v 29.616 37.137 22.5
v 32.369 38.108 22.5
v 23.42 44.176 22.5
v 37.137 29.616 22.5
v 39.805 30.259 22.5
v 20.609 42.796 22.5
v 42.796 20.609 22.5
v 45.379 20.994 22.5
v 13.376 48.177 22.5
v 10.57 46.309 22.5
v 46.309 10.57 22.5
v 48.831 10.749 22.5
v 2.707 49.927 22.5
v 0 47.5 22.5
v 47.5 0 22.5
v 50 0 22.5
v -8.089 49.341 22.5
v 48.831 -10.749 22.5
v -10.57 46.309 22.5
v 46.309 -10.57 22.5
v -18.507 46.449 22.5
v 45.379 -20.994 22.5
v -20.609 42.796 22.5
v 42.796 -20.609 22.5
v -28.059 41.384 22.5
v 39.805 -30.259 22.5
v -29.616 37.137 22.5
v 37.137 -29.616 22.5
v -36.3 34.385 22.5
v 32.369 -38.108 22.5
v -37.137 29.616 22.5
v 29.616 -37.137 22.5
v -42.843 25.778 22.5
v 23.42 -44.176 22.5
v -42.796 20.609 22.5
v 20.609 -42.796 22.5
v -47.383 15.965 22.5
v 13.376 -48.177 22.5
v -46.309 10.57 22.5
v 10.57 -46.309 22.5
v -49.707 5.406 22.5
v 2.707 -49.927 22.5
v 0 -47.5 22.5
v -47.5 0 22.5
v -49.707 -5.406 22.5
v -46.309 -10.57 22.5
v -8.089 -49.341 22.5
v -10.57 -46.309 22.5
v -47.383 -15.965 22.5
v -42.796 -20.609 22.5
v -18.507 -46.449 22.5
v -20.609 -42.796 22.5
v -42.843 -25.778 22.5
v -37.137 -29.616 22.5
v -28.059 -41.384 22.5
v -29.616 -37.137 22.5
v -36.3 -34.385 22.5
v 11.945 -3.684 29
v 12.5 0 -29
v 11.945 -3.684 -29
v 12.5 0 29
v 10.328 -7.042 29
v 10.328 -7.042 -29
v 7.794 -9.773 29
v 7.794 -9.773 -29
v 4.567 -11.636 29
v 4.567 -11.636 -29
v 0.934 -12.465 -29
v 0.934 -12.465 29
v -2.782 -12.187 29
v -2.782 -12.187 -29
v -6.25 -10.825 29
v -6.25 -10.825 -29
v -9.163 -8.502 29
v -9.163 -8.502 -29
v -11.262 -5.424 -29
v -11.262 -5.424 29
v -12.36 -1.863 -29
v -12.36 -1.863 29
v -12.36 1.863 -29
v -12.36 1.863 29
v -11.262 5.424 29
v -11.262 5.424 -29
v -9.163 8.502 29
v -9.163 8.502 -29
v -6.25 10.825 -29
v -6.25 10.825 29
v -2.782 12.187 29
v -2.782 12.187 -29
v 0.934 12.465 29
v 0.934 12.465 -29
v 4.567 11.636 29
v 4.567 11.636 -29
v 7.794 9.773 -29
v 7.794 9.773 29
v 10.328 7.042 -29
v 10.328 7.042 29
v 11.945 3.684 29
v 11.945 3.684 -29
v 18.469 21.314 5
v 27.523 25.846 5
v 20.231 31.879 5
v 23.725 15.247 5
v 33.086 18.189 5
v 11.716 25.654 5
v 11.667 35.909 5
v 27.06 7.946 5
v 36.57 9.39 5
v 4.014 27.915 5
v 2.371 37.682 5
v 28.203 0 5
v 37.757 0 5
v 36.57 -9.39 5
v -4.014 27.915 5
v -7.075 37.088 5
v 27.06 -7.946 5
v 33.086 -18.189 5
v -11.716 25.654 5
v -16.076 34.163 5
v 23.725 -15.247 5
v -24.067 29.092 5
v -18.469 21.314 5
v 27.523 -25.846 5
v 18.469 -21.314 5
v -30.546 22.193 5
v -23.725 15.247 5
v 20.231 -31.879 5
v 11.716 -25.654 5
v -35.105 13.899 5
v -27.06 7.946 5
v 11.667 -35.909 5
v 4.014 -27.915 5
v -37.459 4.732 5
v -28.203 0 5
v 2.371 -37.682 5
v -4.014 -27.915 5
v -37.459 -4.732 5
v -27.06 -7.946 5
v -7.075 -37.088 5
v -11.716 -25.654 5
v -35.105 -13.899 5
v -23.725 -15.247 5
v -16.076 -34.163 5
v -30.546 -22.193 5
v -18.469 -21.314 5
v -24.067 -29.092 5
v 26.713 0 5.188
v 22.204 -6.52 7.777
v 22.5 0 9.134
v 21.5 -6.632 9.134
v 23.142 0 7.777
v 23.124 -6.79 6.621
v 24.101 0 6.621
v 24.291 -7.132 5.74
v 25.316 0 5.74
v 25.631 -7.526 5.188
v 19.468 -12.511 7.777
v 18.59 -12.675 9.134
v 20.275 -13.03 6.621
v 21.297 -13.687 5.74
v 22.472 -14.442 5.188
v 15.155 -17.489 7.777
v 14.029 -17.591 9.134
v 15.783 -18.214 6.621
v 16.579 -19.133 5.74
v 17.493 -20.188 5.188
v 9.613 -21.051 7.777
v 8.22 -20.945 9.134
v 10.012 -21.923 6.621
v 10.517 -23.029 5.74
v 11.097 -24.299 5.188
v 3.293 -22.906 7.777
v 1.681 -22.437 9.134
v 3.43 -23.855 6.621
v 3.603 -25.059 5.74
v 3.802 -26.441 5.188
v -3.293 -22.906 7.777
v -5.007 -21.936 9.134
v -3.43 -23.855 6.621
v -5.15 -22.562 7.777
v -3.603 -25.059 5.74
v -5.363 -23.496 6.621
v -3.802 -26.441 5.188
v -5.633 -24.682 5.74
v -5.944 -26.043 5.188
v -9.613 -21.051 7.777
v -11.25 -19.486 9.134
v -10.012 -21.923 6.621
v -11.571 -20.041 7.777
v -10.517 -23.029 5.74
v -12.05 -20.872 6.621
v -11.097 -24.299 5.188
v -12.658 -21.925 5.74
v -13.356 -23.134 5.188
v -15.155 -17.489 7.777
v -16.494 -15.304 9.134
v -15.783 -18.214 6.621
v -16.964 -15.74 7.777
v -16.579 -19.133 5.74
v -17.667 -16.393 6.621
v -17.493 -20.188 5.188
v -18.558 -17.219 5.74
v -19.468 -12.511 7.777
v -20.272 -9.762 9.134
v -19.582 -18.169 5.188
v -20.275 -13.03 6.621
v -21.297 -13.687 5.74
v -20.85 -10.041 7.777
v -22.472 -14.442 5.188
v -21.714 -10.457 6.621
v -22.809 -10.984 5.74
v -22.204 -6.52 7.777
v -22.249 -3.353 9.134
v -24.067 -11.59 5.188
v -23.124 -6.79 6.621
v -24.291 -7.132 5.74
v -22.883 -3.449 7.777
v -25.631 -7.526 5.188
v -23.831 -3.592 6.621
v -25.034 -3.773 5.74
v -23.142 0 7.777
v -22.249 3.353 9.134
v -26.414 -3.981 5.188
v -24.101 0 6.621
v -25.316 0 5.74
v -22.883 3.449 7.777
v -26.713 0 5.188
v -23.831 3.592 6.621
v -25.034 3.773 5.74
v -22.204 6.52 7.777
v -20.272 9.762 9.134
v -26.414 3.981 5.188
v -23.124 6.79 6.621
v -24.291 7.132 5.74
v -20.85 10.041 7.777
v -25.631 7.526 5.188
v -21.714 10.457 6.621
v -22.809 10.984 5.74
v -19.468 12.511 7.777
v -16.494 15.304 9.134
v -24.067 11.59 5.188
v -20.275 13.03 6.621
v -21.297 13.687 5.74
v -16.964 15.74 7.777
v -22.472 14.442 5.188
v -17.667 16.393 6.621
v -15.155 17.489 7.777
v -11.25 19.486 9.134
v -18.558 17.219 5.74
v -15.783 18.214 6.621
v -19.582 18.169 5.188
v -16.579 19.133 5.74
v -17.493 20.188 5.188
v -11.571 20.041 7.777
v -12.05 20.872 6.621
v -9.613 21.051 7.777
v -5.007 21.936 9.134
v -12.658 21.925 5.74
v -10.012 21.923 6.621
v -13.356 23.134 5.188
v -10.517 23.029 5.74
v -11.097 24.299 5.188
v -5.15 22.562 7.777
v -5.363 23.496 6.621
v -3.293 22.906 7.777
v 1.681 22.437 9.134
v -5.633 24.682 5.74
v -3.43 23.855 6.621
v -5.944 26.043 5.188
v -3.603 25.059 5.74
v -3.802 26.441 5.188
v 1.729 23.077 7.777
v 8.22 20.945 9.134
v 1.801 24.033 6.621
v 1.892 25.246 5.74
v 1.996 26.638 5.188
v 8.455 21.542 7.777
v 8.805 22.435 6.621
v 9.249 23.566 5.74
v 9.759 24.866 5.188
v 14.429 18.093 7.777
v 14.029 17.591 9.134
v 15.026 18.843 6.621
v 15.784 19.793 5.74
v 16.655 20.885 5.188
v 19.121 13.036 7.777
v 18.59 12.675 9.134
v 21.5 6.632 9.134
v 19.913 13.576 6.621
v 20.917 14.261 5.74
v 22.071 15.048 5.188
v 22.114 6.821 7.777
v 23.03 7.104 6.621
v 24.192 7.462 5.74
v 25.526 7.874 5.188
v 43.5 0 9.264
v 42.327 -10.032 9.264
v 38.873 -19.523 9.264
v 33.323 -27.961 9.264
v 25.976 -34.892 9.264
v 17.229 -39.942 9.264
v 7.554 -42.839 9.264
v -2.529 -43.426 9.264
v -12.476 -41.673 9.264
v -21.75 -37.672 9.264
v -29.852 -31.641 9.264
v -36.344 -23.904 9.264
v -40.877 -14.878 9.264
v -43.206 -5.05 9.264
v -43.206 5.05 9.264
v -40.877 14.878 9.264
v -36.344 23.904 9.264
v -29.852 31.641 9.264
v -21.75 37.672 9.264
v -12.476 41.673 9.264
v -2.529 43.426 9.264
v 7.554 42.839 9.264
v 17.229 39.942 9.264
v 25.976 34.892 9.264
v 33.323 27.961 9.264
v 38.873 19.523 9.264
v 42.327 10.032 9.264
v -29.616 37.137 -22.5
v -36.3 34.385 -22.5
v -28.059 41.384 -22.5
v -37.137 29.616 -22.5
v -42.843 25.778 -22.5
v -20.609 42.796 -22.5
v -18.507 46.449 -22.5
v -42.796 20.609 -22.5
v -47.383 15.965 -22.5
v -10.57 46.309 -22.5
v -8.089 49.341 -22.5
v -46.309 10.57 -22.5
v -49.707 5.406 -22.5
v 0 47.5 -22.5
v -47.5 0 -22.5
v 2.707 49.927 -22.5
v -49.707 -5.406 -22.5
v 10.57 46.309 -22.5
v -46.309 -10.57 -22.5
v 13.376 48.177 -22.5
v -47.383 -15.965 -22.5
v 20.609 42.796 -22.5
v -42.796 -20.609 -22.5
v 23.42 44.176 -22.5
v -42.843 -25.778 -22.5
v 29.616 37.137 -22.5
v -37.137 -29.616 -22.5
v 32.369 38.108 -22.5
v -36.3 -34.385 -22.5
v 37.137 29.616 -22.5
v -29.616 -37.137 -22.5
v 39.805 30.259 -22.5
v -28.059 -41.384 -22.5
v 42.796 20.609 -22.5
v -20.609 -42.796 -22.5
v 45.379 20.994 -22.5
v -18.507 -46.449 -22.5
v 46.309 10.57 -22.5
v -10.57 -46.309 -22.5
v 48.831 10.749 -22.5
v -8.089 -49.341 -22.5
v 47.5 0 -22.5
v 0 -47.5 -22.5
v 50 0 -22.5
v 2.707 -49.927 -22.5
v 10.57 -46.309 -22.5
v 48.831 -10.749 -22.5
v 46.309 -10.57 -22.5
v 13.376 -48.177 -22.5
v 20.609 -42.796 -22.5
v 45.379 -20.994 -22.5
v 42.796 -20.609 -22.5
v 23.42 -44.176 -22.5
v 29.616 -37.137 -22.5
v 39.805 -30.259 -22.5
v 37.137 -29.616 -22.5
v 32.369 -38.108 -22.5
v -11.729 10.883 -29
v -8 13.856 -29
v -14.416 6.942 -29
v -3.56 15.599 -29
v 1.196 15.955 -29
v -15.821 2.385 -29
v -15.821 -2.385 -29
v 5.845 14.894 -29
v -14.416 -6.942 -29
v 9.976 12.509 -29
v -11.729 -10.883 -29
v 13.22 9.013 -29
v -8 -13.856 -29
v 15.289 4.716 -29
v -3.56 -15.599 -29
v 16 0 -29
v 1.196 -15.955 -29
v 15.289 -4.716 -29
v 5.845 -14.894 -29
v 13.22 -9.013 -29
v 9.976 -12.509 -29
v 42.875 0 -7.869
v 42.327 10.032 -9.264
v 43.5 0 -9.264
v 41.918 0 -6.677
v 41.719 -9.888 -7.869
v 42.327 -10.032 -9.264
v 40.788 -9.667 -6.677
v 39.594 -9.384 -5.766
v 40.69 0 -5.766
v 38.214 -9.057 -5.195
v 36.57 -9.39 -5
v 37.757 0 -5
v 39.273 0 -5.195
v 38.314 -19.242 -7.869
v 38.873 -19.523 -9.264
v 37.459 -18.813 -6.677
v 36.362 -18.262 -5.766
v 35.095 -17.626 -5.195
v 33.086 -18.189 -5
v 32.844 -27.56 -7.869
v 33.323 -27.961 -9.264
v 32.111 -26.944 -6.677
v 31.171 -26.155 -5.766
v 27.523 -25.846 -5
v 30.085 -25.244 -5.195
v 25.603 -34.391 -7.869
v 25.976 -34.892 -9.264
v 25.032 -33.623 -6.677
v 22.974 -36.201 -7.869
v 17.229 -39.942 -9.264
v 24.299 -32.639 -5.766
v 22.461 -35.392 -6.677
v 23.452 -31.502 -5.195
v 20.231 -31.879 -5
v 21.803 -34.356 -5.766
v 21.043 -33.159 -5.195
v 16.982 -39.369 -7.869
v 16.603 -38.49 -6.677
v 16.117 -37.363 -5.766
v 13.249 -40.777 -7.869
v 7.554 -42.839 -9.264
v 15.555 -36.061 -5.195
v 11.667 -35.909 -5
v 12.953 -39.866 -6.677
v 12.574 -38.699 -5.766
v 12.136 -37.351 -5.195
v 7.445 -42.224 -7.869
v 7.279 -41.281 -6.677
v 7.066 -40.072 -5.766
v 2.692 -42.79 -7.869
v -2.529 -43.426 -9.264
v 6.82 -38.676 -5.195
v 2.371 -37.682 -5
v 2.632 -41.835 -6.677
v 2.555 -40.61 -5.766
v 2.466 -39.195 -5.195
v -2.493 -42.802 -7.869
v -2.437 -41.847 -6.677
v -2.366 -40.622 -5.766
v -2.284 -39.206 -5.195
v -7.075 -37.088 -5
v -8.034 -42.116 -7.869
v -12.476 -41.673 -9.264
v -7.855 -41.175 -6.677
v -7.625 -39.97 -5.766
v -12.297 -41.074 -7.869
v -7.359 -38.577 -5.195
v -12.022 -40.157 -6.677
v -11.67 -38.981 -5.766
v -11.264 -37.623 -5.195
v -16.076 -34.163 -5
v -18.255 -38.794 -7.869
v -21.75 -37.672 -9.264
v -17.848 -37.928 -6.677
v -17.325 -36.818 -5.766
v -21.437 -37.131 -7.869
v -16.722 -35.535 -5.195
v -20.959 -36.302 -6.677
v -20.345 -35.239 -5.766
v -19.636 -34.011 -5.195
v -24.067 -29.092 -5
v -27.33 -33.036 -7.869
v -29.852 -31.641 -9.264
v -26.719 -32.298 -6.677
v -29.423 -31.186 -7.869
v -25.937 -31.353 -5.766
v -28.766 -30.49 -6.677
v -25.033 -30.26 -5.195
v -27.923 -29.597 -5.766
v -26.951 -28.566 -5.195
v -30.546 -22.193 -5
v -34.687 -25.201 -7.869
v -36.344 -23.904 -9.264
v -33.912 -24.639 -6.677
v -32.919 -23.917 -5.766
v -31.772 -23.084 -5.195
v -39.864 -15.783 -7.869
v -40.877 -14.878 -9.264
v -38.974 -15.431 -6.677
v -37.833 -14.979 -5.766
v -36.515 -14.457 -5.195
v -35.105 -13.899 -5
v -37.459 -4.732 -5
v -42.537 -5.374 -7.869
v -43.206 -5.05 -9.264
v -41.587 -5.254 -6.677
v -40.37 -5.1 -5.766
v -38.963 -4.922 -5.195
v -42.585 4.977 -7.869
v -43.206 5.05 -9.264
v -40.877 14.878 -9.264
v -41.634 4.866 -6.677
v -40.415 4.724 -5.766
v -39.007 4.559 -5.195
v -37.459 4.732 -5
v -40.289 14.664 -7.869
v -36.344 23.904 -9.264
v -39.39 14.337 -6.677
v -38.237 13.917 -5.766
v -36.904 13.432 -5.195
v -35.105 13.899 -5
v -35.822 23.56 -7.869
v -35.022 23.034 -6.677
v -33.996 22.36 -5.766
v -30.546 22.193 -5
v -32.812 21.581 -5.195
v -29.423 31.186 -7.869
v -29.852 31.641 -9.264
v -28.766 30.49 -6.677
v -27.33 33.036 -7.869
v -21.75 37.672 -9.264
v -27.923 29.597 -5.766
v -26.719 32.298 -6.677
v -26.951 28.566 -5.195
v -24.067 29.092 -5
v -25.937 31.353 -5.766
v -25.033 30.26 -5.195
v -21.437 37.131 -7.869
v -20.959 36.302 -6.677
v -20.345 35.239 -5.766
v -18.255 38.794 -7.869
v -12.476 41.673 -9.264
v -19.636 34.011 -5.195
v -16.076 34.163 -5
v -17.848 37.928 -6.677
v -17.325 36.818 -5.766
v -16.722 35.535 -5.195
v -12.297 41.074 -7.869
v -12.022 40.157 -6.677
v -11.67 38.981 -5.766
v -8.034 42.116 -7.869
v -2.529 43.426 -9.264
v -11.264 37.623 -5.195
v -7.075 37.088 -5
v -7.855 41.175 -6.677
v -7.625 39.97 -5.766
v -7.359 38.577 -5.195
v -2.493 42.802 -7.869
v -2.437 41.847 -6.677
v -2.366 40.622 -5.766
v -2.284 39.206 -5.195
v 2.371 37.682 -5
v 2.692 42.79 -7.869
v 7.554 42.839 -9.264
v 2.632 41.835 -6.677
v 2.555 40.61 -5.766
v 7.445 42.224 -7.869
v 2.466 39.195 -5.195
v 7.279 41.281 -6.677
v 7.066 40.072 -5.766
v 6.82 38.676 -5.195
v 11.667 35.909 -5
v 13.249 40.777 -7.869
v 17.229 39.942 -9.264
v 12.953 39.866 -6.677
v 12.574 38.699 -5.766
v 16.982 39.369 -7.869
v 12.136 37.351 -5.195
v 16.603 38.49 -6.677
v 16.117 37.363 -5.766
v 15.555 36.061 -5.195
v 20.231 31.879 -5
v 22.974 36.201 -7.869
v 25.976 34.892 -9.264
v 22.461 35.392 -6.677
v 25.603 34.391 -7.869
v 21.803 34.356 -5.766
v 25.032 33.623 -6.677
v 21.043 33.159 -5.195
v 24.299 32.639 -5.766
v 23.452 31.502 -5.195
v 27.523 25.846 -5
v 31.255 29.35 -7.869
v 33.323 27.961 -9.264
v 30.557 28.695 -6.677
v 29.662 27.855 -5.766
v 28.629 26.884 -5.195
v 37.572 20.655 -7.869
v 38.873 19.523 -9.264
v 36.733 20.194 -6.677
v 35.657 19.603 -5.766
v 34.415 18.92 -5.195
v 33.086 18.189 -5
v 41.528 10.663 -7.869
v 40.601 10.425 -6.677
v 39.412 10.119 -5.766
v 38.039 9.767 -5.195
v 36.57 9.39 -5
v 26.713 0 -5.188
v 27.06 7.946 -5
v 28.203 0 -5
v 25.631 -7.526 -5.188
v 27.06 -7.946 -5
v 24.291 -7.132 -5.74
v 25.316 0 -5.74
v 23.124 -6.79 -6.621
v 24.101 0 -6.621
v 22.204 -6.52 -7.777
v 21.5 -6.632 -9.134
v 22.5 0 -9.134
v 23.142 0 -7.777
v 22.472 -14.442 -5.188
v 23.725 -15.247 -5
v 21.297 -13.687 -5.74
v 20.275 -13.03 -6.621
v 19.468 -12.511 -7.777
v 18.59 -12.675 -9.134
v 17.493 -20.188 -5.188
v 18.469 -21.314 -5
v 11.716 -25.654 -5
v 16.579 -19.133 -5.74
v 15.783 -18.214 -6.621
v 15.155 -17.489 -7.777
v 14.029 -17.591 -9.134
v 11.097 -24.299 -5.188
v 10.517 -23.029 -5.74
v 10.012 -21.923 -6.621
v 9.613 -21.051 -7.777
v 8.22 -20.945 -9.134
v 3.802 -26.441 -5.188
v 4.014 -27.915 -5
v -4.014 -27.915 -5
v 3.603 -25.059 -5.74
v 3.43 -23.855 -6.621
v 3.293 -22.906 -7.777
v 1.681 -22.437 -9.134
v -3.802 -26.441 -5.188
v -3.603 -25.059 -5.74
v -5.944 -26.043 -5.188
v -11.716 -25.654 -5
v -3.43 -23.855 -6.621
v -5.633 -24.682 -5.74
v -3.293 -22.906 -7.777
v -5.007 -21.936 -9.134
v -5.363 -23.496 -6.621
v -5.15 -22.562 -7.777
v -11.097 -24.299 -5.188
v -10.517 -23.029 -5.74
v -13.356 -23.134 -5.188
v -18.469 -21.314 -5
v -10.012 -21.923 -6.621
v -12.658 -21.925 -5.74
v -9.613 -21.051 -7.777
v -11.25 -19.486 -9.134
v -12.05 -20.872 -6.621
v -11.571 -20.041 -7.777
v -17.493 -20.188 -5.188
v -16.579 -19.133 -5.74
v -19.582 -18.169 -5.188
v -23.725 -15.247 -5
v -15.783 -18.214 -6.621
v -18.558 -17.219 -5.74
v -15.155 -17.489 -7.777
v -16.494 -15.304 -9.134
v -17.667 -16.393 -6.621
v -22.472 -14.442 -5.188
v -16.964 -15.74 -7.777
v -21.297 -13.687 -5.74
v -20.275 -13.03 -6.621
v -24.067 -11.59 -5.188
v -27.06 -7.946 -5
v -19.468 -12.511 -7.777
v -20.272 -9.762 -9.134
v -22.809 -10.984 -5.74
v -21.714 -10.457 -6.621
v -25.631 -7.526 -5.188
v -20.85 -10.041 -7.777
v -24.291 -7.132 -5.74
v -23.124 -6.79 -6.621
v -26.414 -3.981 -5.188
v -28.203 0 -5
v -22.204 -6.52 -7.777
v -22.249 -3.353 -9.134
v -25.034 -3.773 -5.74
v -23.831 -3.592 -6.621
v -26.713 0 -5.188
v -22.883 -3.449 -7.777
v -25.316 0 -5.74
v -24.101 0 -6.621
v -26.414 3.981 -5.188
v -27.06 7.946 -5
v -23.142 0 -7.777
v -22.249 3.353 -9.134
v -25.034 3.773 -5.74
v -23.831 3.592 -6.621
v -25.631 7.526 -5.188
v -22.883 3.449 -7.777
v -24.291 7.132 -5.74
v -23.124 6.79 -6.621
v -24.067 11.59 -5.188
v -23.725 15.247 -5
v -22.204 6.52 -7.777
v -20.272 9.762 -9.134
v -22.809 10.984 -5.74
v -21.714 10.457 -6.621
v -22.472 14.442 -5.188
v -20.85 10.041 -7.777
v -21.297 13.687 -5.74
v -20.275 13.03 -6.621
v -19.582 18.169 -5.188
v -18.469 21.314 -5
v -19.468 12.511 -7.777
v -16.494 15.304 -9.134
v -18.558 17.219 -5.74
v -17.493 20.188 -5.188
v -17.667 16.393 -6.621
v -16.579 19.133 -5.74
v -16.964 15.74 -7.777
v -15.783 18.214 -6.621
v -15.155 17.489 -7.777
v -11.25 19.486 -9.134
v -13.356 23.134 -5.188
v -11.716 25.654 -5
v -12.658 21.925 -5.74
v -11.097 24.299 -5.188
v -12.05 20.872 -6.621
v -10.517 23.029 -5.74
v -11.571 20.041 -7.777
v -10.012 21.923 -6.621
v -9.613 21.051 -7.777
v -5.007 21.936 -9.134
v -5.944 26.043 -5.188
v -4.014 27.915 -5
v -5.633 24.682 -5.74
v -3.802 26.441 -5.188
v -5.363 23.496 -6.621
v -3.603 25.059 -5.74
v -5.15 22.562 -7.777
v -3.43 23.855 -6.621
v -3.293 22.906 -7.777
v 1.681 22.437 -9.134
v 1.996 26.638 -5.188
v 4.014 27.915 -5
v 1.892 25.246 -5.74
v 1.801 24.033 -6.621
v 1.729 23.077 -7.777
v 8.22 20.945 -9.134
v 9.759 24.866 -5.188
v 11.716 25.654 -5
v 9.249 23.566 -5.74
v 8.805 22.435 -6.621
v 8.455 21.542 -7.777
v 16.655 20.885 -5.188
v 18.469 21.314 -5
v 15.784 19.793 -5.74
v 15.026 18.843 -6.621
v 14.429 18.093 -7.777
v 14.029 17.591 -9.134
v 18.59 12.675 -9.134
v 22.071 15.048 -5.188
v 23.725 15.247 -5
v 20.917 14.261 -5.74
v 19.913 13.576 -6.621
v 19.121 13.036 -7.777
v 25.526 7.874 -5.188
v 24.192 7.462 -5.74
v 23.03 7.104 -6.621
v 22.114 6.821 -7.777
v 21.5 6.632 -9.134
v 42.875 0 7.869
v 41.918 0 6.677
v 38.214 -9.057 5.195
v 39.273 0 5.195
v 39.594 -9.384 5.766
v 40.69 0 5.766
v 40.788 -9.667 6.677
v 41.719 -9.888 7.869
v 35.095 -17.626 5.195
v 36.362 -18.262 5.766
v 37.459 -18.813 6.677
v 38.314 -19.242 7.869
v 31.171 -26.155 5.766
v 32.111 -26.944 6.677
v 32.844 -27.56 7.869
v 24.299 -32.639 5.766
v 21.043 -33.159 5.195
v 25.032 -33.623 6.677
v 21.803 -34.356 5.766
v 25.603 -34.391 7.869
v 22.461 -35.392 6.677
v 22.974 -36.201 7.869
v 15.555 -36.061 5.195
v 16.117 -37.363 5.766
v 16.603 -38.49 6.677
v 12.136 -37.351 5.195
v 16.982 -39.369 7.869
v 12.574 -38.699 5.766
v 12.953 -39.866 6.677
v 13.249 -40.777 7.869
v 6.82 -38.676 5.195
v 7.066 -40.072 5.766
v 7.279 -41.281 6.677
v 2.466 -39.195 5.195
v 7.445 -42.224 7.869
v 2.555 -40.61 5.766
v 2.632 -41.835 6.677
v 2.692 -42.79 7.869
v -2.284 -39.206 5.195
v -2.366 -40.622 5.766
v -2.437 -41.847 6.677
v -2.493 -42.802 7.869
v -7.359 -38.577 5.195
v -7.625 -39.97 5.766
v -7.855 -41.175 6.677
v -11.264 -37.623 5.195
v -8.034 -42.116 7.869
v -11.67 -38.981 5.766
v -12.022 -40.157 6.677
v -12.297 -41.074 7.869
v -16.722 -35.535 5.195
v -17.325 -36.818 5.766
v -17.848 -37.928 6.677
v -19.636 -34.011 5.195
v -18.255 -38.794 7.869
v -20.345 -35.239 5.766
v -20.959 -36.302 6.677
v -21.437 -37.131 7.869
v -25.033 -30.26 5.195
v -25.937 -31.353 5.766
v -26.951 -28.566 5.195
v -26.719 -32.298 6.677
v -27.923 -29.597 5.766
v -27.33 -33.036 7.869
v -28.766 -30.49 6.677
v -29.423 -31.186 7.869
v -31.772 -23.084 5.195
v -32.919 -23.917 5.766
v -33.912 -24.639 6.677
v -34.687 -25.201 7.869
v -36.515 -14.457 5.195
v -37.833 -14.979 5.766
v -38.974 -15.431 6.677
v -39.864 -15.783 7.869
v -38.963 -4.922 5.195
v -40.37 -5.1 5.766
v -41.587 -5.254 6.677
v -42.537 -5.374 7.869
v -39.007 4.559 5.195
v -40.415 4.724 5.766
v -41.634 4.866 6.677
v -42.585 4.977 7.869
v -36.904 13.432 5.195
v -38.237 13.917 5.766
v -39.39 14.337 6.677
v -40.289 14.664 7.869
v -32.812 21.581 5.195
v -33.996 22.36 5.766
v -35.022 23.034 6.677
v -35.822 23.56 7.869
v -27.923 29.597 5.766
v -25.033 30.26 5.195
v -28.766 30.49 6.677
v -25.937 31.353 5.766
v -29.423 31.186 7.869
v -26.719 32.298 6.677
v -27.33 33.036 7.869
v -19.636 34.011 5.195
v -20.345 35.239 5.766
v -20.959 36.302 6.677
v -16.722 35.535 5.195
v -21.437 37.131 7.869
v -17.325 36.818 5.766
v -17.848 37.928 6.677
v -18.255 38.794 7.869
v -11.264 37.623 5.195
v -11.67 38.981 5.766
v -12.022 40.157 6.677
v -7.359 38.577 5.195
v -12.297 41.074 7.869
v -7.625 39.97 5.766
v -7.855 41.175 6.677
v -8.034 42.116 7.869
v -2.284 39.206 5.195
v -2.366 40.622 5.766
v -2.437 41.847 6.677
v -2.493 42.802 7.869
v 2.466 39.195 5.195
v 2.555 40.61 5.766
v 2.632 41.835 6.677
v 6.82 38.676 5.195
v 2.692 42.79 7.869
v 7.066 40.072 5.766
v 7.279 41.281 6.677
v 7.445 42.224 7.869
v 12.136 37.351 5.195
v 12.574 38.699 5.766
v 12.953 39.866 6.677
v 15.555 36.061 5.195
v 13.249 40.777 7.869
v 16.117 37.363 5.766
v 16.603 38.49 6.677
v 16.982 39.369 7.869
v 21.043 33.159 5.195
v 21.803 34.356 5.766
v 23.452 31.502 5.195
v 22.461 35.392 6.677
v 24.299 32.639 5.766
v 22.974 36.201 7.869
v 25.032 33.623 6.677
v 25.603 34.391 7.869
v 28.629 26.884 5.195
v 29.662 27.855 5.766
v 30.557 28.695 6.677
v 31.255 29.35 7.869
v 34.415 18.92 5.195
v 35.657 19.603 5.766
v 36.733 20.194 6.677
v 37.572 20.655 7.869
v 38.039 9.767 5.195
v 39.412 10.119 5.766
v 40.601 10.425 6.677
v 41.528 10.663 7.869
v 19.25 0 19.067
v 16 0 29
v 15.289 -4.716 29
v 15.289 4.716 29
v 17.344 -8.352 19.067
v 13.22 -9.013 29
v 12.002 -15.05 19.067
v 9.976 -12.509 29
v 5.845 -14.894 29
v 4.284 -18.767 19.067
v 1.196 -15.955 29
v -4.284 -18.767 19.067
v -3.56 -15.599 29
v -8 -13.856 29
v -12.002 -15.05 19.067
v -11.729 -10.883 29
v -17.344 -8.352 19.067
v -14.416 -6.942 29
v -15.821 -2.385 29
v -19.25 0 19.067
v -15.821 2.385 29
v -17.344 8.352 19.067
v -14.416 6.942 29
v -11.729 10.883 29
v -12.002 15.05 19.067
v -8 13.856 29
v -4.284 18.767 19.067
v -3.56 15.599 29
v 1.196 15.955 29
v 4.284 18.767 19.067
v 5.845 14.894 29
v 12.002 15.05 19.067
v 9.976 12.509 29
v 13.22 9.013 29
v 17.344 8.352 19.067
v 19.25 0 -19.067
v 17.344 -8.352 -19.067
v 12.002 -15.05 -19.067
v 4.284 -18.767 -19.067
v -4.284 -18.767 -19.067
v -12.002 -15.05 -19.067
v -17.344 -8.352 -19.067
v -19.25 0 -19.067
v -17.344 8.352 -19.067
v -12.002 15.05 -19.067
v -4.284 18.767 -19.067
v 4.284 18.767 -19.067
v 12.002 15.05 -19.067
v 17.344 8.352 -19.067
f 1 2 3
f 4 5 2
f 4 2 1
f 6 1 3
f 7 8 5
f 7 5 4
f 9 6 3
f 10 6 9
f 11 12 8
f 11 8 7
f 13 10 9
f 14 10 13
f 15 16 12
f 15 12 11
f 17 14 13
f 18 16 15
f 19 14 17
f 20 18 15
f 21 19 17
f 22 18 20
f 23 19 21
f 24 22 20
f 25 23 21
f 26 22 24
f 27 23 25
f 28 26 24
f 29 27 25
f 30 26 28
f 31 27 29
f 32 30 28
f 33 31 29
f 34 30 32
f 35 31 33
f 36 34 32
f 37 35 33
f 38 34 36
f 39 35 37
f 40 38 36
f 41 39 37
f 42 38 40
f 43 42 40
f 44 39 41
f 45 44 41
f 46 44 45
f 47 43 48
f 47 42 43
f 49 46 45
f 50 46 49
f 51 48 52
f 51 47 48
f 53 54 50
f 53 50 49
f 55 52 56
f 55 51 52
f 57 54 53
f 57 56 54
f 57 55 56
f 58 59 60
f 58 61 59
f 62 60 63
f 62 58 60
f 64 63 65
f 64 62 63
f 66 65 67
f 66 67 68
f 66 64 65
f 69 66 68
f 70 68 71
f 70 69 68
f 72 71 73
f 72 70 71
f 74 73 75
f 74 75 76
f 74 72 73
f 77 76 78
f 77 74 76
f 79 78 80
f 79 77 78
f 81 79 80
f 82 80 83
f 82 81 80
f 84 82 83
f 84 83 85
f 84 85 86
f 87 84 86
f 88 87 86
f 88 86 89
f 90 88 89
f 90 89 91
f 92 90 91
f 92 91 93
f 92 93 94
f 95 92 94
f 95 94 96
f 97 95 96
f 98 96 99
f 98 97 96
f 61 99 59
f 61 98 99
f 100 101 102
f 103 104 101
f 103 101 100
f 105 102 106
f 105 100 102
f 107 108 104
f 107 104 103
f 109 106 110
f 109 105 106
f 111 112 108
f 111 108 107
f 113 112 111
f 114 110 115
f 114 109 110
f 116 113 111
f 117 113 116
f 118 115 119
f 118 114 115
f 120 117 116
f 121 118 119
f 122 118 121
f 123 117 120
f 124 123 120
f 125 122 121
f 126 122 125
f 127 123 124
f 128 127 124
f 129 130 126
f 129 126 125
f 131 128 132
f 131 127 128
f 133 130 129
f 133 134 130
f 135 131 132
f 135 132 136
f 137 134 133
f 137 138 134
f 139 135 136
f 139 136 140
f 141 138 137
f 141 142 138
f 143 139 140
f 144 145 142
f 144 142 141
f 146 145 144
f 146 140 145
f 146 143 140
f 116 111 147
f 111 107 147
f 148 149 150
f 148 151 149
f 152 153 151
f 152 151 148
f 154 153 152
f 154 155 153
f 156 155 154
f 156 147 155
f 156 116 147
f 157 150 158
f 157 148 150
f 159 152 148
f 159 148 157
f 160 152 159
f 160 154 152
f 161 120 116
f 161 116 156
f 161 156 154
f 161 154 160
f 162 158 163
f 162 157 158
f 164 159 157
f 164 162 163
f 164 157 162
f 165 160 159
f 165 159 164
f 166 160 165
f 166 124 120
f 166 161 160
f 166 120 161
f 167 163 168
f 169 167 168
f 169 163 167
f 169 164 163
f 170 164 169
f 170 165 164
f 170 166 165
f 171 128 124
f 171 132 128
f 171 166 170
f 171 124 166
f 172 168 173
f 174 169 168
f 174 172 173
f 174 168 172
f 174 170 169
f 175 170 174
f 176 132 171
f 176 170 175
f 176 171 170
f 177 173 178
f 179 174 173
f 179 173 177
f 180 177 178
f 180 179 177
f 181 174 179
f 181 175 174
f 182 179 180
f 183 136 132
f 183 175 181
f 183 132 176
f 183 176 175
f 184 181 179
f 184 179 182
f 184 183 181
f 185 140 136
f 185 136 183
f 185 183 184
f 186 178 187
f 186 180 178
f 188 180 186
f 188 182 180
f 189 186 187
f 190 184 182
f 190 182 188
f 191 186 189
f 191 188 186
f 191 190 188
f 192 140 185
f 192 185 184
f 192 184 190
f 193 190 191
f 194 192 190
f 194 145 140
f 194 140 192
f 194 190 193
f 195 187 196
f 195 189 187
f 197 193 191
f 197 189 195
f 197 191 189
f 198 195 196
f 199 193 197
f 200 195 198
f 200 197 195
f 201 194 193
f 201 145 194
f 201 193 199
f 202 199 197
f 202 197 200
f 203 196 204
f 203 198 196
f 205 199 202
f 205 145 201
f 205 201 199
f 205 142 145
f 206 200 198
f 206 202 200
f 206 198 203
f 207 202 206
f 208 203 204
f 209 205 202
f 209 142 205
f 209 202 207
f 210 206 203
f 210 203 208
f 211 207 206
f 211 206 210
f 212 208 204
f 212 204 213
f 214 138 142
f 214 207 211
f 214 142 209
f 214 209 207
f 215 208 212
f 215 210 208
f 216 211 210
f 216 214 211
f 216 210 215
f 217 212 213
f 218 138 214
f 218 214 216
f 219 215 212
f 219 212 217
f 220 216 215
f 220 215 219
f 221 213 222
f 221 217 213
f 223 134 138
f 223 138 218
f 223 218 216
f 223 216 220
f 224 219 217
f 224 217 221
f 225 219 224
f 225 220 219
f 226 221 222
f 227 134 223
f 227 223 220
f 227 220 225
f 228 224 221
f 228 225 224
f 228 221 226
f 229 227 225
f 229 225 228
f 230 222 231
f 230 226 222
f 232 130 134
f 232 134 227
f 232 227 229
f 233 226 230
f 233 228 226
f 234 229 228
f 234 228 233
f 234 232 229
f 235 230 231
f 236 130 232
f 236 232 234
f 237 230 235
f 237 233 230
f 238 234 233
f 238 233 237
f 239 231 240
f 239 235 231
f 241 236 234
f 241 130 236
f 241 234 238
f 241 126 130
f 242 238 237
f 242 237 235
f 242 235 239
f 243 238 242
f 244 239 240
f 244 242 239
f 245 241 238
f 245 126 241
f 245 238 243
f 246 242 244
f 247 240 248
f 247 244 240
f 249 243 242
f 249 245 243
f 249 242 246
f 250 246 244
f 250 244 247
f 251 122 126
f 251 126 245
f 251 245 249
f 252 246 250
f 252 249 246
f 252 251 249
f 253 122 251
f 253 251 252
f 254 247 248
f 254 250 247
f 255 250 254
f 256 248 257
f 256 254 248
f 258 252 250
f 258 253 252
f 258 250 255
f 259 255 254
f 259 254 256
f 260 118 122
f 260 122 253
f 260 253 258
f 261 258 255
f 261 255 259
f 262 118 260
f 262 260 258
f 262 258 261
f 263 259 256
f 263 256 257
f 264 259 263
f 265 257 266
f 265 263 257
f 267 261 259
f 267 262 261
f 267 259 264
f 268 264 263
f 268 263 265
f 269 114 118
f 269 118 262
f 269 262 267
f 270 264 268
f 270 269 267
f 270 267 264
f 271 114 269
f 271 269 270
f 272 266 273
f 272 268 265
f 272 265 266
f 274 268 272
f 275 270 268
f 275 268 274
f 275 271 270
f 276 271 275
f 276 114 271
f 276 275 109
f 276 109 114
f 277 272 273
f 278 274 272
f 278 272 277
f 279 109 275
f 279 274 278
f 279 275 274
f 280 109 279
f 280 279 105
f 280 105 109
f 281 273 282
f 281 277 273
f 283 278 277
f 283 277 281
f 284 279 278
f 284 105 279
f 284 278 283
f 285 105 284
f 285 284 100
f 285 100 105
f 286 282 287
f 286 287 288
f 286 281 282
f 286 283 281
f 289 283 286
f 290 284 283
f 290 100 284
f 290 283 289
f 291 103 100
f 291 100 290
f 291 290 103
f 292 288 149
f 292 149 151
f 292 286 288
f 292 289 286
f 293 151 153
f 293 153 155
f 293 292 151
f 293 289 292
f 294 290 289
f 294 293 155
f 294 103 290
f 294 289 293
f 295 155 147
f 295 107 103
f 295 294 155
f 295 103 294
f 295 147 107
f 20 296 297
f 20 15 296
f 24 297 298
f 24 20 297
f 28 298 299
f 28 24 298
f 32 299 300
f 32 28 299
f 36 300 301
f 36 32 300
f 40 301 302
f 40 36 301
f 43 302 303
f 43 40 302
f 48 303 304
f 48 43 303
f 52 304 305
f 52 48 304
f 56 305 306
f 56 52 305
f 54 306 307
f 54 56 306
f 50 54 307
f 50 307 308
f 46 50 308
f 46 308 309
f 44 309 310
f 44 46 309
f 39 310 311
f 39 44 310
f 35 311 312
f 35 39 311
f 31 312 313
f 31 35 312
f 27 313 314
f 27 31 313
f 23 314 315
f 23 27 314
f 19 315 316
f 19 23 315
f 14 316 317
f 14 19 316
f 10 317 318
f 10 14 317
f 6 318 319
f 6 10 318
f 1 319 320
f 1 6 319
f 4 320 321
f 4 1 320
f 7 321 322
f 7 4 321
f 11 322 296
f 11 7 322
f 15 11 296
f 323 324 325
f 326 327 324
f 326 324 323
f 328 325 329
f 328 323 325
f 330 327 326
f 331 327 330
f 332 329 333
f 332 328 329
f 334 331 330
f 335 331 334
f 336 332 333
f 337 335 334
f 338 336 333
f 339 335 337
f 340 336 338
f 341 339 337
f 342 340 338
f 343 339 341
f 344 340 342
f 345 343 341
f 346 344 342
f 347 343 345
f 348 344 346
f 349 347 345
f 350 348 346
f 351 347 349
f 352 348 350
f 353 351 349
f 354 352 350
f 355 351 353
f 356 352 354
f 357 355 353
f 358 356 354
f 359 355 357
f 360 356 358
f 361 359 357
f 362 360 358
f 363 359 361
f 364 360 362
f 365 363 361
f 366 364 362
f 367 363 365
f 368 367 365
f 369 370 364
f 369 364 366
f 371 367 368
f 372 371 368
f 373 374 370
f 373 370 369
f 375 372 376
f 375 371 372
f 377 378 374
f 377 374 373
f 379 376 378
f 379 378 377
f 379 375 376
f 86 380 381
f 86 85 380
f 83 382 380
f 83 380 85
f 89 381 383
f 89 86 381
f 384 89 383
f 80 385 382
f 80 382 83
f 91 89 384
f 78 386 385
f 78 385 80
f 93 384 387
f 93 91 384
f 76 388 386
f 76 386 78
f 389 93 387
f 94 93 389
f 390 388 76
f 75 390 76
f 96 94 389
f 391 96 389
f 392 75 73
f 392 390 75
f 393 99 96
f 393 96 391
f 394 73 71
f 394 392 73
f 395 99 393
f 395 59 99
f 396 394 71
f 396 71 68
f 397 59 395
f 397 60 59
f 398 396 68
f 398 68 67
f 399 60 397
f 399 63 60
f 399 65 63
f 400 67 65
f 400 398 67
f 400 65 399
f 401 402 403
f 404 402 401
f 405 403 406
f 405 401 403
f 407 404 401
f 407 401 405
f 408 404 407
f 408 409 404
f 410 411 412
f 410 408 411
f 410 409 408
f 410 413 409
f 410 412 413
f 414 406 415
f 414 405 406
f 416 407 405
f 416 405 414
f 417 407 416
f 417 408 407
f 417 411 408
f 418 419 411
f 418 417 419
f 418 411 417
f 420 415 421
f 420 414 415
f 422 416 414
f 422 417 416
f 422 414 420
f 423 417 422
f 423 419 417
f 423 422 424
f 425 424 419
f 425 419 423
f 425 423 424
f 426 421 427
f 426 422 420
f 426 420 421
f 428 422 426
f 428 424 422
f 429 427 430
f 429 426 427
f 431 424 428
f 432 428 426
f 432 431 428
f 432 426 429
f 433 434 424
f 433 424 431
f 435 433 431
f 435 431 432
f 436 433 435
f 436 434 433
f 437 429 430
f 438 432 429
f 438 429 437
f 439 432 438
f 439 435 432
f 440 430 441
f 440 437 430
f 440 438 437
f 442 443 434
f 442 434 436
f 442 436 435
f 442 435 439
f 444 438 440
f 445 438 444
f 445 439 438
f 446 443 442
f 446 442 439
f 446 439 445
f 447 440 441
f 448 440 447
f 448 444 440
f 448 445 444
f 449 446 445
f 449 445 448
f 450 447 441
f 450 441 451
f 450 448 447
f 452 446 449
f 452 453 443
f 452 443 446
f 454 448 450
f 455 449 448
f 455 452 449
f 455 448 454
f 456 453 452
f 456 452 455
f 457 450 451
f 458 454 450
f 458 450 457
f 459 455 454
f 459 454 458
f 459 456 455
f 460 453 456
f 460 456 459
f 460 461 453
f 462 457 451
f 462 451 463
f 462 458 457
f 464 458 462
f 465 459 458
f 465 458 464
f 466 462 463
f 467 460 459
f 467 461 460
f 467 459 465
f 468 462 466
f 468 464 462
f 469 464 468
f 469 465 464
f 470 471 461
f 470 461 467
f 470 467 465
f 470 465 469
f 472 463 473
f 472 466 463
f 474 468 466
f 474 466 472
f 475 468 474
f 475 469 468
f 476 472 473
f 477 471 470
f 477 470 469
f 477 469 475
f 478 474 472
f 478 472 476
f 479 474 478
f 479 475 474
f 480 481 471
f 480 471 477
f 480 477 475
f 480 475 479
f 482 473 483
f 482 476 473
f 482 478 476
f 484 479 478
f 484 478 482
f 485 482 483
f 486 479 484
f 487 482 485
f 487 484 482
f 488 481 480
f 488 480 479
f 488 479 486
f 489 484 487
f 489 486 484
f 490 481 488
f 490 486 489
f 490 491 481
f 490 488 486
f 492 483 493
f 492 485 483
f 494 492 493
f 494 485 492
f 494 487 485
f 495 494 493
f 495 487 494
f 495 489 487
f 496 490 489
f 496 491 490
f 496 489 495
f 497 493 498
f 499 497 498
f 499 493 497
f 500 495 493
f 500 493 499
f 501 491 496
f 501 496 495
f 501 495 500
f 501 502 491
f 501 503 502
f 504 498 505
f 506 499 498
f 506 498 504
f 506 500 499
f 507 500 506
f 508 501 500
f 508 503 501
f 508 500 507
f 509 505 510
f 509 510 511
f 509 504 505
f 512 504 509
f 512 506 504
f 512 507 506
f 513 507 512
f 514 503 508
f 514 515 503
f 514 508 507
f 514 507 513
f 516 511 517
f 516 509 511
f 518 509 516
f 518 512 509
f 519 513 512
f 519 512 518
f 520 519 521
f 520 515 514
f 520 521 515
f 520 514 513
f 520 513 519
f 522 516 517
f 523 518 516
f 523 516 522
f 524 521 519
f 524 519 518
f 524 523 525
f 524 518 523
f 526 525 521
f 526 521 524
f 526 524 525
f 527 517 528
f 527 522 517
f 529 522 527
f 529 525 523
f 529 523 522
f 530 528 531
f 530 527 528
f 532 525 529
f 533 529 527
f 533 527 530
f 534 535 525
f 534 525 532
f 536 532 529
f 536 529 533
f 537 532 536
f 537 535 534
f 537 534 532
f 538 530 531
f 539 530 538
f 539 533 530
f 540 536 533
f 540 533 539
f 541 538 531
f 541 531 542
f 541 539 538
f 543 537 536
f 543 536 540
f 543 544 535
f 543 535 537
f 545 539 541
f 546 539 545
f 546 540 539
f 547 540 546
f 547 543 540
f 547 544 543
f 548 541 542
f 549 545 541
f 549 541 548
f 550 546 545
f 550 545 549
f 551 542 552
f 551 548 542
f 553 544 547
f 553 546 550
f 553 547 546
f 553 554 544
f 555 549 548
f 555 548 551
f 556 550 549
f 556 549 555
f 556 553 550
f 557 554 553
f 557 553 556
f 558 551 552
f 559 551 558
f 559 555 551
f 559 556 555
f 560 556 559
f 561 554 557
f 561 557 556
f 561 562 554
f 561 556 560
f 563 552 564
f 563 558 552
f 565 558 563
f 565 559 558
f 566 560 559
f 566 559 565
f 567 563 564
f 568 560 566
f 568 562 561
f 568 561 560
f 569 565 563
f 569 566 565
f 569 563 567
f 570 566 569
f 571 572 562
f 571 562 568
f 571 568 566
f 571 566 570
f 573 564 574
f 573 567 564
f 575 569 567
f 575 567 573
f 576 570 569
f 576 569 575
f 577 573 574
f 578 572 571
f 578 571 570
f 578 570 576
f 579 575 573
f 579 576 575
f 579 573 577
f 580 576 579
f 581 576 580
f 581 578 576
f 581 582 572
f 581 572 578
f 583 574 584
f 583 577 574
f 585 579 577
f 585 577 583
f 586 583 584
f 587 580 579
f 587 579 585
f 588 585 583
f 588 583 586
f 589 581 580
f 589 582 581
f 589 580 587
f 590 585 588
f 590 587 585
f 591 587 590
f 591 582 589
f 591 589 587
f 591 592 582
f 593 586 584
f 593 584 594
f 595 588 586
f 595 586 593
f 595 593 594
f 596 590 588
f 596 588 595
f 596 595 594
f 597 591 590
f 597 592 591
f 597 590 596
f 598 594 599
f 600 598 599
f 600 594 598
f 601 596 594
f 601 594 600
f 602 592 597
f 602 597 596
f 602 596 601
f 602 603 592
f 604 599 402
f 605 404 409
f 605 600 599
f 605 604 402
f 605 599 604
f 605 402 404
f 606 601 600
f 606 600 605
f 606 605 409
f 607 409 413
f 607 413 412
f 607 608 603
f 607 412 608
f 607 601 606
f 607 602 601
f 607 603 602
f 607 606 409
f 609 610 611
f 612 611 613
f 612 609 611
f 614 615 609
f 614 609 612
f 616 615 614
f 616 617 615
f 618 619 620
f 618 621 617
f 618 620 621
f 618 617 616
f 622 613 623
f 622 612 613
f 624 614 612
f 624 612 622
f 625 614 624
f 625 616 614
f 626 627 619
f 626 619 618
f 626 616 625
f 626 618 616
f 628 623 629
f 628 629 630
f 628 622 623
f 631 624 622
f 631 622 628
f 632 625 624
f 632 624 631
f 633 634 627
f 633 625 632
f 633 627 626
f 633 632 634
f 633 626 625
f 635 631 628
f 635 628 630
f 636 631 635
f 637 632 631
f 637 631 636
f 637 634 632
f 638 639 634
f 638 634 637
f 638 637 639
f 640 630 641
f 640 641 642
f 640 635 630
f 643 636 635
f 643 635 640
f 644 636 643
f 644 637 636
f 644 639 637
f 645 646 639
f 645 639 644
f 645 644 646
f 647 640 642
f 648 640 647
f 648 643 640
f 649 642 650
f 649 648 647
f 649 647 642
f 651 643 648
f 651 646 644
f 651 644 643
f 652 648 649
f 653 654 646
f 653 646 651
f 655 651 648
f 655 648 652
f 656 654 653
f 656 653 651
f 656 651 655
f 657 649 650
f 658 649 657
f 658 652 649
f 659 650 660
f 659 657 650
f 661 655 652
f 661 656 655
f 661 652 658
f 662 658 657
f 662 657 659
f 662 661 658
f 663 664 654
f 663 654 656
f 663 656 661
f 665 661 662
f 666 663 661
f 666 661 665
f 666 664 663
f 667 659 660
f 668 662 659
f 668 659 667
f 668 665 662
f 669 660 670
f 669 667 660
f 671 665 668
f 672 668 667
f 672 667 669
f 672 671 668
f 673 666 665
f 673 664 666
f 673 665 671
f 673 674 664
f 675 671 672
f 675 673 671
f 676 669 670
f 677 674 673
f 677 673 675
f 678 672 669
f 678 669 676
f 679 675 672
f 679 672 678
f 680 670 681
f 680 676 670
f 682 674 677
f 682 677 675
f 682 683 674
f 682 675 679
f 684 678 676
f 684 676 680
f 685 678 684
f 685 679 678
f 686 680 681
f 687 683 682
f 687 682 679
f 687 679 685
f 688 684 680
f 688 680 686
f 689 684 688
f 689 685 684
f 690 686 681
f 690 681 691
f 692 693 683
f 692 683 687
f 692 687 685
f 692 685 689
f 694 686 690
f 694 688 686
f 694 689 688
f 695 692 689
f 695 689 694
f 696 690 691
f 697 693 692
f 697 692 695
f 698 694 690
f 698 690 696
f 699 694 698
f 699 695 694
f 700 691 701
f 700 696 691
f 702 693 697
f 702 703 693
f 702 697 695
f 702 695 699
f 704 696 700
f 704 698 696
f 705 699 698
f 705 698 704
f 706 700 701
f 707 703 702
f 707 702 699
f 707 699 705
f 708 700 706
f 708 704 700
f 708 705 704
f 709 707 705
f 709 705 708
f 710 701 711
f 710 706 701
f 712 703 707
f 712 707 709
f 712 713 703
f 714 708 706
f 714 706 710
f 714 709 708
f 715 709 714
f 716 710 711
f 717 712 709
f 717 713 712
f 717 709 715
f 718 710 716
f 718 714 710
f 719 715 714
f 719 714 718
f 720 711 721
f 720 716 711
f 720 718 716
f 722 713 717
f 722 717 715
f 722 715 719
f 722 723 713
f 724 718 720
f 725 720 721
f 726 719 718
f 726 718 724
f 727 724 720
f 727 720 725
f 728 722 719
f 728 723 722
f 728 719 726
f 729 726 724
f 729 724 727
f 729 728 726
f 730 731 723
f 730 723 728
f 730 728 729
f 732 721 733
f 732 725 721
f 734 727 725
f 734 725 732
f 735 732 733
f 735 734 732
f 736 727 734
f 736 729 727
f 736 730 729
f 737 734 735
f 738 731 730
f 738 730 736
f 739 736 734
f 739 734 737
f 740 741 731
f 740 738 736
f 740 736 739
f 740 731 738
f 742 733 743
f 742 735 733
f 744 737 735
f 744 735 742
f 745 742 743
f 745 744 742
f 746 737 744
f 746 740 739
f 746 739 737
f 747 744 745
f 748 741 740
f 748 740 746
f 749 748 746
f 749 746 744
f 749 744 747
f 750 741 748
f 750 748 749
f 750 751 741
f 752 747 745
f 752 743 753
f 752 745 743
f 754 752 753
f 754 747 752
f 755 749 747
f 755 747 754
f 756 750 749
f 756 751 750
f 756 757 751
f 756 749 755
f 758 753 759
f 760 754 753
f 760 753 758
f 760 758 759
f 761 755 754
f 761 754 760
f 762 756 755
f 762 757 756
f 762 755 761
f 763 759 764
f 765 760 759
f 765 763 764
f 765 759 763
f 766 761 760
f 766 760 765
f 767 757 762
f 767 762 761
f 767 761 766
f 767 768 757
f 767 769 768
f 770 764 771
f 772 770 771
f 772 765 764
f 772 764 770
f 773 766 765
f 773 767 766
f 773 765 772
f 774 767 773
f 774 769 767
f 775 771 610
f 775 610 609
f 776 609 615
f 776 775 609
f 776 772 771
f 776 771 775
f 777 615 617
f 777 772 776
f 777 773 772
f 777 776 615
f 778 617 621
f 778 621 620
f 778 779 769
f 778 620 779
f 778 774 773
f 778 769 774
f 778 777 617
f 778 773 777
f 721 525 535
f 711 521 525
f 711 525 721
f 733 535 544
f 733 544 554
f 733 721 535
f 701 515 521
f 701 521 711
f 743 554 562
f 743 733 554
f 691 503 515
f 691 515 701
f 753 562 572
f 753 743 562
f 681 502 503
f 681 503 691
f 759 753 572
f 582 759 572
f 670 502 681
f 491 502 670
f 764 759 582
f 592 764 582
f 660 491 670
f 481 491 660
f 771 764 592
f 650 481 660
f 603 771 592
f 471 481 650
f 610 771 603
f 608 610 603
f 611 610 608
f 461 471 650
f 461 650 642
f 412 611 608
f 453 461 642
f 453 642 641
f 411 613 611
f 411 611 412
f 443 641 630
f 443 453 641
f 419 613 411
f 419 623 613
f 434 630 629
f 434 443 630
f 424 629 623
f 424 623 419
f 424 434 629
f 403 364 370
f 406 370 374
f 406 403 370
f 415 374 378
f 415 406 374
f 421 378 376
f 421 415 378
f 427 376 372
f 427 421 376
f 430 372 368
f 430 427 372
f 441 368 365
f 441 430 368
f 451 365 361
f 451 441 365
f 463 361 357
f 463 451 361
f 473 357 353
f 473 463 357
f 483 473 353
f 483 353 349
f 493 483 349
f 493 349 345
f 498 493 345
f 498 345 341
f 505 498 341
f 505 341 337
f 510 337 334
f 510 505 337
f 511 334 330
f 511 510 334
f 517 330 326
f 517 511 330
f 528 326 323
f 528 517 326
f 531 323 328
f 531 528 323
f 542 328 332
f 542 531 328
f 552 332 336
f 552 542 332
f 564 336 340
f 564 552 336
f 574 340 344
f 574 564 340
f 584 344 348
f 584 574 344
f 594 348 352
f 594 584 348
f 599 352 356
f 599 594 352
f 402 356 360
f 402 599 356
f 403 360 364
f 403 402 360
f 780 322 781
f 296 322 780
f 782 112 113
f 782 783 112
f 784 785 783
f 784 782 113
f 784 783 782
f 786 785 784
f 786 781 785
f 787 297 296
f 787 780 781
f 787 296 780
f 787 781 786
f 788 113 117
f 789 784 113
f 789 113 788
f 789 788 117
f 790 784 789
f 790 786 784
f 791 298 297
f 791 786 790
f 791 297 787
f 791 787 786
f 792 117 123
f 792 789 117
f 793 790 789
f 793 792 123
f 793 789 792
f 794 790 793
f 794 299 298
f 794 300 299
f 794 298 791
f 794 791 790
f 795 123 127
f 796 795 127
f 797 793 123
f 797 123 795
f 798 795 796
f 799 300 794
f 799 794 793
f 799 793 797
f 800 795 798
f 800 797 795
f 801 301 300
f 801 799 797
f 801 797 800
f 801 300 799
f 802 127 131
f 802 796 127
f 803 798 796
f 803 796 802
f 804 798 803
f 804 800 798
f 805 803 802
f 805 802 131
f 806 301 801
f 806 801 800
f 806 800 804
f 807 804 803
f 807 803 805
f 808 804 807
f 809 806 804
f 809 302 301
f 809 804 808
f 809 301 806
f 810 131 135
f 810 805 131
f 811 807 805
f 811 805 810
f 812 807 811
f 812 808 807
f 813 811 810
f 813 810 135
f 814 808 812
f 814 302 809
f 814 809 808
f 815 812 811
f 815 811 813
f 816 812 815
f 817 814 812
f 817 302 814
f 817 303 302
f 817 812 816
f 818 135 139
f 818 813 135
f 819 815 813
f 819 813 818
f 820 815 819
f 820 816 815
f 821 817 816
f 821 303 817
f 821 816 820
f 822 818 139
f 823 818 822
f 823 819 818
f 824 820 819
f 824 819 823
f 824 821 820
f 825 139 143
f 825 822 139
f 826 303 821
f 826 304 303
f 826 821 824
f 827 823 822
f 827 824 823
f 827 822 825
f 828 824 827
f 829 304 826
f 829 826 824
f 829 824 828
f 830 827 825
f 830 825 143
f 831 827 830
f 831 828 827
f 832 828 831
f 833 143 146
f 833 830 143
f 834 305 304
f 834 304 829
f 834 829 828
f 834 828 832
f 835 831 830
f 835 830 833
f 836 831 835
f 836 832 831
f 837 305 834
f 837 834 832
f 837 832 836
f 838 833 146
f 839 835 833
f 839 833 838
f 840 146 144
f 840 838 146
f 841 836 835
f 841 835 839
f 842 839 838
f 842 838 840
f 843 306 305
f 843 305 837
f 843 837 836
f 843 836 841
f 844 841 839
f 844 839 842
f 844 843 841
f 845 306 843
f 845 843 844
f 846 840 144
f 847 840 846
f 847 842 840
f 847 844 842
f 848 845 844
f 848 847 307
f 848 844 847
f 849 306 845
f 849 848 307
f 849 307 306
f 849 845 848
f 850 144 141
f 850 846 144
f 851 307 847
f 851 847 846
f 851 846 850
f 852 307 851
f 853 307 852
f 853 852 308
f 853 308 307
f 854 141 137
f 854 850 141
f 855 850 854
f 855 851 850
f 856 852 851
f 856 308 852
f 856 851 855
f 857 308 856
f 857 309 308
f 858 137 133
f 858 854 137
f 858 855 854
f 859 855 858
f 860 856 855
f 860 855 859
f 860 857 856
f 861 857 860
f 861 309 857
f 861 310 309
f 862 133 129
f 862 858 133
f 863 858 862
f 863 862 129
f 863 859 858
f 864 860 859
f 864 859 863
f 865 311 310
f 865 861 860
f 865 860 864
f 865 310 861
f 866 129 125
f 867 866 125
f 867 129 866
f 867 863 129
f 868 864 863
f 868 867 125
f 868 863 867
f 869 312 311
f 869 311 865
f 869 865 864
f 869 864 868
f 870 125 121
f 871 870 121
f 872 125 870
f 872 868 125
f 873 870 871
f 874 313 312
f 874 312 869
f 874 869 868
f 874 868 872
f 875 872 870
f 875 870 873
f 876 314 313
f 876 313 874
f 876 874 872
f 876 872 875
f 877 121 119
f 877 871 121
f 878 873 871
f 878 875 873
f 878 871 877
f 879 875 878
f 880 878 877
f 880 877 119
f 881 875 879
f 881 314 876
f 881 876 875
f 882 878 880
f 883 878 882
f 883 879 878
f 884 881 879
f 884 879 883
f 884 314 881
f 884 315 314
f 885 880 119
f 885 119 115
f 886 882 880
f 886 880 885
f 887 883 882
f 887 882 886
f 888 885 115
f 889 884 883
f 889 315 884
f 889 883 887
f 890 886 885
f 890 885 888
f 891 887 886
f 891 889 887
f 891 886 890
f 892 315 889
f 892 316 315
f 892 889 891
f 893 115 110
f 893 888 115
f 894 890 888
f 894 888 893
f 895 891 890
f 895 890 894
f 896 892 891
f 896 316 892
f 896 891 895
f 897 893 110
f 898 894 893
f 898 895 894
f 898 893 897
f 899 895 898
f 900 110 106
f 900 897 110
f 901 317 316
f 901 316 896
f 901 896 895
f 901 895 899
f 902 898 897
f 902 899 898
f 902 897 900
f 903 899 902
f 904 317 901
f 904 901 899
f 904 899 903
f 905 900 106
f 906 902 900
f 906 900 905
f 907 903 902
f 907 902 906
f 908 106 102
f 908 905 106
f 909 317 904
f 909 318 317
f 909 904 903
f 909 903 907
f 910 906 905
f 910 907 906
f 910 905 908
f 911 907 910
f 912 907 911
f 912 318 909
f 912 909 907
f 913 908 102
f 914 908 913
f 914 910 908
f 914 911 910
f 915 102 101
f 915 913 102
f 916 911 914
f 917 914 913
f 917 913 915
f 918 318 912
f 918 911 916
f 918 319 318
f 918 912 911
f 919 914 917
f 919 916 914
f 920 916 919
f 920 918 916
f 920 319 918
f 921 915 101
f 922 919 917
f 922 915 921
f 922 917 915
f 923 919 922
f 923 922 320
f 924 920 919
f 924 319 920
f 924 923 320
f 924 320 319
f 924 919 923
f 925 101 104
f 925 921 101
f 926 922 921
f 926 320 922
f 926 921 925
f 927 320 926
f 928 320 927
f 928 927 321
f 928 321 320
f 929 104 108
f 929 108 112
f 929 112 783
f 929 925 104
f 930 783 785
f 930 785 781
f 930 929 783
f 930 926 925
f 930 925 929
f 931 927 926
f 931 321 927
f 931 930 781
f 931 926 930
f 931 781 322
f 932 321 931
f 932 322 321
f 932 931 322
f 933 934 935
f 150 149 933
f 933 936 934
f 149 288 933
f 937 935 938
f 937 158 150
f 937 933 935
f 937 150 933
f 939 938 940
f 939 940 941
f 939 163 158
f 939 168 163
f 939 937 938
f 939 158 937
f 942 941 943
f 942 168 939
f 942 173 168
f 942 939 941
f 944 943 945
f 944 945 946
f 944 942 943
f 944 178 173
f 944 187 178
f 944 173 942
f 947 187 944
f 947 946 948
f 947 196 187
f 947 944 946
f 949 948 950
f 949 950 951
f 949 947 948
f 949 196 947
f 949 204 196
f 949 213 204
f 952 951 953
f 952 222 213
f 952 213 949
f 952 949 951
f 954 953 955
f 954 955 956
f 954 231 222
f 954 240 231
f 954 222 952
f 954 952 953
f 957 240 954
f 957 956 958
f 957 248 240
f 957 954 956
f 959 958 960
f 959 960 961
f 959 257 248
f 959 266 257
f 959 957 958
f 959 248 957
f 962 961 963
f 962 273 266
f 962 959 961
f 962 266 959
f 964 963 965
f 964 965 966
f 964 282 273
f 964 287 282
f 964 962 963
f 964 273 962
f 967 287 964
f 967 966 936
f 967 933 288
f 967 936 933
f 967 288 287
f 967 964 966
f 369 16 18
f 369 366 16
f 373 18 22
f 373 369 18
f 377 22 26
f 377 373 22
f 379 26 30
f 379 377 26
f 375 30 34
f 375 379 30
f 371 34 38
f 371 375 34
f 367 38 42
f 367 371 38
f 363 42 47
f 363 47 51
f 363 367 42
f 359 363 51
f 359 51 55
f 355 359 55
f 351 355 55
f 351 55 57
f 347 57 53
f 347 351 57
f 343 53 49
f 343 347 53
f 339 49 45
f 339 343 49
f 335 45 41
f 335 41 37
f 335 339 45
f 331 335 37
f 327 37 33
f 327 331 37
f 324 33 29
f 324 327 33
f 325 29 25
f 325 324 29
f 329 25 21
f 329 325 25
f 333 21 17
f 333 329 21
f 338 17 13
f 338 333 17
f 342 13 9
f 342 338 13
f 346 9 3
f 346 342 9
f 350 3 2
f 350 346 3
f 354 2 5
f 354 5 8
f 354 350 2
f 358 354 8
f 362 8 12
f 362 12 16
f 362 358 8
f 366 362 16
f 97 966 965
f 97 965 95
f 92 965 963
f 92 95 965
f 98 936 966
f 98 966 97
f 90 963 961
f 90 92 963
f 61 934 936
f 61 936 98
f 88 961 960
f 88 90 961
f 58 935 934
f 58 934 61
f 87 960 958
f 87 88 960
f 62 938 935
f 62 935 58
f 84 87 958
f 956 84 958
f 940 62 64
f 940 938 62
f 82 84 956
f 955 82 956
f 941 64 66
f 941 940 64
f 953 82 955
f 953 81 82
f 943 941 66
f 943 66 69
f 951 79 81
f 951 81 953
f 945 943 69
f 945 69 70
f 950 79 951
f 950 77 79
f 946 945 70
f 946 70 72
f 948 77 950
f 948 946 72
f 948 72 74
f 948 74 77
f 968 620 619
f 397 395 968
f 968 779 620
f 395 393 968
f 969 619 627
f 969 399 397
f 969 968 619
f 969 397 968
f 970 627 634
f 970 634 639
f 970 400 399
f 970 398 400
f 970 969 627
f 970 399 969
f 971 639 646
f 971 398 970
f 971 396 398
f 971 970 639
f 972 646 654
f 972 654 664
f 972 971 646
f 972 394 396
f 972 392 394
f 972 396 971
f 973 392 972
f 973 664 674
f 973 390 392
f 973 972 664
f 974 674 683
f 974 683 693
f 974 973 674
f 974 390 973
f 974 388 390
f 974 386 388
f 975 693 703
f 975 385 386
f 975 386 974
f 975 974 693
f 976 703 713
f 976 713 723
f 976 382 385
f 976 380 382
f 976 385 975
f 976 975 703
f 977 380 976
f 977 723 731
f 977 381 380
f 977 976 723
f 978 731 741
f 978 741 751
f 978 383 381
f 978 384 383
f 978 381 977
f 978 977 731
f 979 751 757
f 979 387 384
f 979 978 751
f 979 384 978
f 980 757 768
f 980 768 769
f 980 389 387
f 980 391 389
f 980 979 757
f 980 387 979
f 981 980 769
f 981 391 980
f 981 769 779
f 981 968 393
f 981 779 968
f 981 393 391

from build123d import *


with BuildPart() as part:
    # Sketch1 → Revolve1 (revolve)
    with BuildSketch(Plane(origin=(0, 0, 0), x_dir=(0, 0, -1), z_dir=(1, 0, 0)), mode=Mode.PRIVATE) as revolve1_sk:
        with BuildLine():
            Line((-22.5, 50), (22.5, 50))
            Line((22.5, 50), (22.5, 47.5))
            Line((22.5, 47.5), (9.264260449, 43.5))
            ThreePointArc((9.264260449, 43.5), (6.182612881, 41.333250628), (5, 37.756550844))
            Line((5, 37.756550844), (5, 28.202513909))
            ThreePointArc((5, 28.202513909), (6.142274104, 24.680795703), (9.134166373, 22.5))
            Line((9.134166373, 22.5), (29, 16))
            Line((29, 16), (29, 12.5))
            Line((29, 12.5), (-29, 12.5))
            Line((-29, 12.5), (-29, 16))
            Line((-29, 16), (-9.134166373, 22.5))
            ThreePointArc((-9.134166373, 22.5), (-6.142274104, 24.680795703), (-5, 28.202513909))
            Line((-5, 28.202513909), (-5, 37.756550844))
            ThreePointArc((-5, 37.756550844), (-6.182612881, 41.333250628), (-9.264260449, 43.5))
            Line((-9.264260449, 43.5), (-22.5, 47.5))
            Line((-22.5, 47.5), (-22.5, 50))
        make_face()
    revolve(revolve1_sk.sketch.rotate(Axis((0, 0, 41.444357118), (0, 0, -1)), 90), axis=Axis((0, 0, 41.444357118), (0, 0, -1)))


solid = part.part
